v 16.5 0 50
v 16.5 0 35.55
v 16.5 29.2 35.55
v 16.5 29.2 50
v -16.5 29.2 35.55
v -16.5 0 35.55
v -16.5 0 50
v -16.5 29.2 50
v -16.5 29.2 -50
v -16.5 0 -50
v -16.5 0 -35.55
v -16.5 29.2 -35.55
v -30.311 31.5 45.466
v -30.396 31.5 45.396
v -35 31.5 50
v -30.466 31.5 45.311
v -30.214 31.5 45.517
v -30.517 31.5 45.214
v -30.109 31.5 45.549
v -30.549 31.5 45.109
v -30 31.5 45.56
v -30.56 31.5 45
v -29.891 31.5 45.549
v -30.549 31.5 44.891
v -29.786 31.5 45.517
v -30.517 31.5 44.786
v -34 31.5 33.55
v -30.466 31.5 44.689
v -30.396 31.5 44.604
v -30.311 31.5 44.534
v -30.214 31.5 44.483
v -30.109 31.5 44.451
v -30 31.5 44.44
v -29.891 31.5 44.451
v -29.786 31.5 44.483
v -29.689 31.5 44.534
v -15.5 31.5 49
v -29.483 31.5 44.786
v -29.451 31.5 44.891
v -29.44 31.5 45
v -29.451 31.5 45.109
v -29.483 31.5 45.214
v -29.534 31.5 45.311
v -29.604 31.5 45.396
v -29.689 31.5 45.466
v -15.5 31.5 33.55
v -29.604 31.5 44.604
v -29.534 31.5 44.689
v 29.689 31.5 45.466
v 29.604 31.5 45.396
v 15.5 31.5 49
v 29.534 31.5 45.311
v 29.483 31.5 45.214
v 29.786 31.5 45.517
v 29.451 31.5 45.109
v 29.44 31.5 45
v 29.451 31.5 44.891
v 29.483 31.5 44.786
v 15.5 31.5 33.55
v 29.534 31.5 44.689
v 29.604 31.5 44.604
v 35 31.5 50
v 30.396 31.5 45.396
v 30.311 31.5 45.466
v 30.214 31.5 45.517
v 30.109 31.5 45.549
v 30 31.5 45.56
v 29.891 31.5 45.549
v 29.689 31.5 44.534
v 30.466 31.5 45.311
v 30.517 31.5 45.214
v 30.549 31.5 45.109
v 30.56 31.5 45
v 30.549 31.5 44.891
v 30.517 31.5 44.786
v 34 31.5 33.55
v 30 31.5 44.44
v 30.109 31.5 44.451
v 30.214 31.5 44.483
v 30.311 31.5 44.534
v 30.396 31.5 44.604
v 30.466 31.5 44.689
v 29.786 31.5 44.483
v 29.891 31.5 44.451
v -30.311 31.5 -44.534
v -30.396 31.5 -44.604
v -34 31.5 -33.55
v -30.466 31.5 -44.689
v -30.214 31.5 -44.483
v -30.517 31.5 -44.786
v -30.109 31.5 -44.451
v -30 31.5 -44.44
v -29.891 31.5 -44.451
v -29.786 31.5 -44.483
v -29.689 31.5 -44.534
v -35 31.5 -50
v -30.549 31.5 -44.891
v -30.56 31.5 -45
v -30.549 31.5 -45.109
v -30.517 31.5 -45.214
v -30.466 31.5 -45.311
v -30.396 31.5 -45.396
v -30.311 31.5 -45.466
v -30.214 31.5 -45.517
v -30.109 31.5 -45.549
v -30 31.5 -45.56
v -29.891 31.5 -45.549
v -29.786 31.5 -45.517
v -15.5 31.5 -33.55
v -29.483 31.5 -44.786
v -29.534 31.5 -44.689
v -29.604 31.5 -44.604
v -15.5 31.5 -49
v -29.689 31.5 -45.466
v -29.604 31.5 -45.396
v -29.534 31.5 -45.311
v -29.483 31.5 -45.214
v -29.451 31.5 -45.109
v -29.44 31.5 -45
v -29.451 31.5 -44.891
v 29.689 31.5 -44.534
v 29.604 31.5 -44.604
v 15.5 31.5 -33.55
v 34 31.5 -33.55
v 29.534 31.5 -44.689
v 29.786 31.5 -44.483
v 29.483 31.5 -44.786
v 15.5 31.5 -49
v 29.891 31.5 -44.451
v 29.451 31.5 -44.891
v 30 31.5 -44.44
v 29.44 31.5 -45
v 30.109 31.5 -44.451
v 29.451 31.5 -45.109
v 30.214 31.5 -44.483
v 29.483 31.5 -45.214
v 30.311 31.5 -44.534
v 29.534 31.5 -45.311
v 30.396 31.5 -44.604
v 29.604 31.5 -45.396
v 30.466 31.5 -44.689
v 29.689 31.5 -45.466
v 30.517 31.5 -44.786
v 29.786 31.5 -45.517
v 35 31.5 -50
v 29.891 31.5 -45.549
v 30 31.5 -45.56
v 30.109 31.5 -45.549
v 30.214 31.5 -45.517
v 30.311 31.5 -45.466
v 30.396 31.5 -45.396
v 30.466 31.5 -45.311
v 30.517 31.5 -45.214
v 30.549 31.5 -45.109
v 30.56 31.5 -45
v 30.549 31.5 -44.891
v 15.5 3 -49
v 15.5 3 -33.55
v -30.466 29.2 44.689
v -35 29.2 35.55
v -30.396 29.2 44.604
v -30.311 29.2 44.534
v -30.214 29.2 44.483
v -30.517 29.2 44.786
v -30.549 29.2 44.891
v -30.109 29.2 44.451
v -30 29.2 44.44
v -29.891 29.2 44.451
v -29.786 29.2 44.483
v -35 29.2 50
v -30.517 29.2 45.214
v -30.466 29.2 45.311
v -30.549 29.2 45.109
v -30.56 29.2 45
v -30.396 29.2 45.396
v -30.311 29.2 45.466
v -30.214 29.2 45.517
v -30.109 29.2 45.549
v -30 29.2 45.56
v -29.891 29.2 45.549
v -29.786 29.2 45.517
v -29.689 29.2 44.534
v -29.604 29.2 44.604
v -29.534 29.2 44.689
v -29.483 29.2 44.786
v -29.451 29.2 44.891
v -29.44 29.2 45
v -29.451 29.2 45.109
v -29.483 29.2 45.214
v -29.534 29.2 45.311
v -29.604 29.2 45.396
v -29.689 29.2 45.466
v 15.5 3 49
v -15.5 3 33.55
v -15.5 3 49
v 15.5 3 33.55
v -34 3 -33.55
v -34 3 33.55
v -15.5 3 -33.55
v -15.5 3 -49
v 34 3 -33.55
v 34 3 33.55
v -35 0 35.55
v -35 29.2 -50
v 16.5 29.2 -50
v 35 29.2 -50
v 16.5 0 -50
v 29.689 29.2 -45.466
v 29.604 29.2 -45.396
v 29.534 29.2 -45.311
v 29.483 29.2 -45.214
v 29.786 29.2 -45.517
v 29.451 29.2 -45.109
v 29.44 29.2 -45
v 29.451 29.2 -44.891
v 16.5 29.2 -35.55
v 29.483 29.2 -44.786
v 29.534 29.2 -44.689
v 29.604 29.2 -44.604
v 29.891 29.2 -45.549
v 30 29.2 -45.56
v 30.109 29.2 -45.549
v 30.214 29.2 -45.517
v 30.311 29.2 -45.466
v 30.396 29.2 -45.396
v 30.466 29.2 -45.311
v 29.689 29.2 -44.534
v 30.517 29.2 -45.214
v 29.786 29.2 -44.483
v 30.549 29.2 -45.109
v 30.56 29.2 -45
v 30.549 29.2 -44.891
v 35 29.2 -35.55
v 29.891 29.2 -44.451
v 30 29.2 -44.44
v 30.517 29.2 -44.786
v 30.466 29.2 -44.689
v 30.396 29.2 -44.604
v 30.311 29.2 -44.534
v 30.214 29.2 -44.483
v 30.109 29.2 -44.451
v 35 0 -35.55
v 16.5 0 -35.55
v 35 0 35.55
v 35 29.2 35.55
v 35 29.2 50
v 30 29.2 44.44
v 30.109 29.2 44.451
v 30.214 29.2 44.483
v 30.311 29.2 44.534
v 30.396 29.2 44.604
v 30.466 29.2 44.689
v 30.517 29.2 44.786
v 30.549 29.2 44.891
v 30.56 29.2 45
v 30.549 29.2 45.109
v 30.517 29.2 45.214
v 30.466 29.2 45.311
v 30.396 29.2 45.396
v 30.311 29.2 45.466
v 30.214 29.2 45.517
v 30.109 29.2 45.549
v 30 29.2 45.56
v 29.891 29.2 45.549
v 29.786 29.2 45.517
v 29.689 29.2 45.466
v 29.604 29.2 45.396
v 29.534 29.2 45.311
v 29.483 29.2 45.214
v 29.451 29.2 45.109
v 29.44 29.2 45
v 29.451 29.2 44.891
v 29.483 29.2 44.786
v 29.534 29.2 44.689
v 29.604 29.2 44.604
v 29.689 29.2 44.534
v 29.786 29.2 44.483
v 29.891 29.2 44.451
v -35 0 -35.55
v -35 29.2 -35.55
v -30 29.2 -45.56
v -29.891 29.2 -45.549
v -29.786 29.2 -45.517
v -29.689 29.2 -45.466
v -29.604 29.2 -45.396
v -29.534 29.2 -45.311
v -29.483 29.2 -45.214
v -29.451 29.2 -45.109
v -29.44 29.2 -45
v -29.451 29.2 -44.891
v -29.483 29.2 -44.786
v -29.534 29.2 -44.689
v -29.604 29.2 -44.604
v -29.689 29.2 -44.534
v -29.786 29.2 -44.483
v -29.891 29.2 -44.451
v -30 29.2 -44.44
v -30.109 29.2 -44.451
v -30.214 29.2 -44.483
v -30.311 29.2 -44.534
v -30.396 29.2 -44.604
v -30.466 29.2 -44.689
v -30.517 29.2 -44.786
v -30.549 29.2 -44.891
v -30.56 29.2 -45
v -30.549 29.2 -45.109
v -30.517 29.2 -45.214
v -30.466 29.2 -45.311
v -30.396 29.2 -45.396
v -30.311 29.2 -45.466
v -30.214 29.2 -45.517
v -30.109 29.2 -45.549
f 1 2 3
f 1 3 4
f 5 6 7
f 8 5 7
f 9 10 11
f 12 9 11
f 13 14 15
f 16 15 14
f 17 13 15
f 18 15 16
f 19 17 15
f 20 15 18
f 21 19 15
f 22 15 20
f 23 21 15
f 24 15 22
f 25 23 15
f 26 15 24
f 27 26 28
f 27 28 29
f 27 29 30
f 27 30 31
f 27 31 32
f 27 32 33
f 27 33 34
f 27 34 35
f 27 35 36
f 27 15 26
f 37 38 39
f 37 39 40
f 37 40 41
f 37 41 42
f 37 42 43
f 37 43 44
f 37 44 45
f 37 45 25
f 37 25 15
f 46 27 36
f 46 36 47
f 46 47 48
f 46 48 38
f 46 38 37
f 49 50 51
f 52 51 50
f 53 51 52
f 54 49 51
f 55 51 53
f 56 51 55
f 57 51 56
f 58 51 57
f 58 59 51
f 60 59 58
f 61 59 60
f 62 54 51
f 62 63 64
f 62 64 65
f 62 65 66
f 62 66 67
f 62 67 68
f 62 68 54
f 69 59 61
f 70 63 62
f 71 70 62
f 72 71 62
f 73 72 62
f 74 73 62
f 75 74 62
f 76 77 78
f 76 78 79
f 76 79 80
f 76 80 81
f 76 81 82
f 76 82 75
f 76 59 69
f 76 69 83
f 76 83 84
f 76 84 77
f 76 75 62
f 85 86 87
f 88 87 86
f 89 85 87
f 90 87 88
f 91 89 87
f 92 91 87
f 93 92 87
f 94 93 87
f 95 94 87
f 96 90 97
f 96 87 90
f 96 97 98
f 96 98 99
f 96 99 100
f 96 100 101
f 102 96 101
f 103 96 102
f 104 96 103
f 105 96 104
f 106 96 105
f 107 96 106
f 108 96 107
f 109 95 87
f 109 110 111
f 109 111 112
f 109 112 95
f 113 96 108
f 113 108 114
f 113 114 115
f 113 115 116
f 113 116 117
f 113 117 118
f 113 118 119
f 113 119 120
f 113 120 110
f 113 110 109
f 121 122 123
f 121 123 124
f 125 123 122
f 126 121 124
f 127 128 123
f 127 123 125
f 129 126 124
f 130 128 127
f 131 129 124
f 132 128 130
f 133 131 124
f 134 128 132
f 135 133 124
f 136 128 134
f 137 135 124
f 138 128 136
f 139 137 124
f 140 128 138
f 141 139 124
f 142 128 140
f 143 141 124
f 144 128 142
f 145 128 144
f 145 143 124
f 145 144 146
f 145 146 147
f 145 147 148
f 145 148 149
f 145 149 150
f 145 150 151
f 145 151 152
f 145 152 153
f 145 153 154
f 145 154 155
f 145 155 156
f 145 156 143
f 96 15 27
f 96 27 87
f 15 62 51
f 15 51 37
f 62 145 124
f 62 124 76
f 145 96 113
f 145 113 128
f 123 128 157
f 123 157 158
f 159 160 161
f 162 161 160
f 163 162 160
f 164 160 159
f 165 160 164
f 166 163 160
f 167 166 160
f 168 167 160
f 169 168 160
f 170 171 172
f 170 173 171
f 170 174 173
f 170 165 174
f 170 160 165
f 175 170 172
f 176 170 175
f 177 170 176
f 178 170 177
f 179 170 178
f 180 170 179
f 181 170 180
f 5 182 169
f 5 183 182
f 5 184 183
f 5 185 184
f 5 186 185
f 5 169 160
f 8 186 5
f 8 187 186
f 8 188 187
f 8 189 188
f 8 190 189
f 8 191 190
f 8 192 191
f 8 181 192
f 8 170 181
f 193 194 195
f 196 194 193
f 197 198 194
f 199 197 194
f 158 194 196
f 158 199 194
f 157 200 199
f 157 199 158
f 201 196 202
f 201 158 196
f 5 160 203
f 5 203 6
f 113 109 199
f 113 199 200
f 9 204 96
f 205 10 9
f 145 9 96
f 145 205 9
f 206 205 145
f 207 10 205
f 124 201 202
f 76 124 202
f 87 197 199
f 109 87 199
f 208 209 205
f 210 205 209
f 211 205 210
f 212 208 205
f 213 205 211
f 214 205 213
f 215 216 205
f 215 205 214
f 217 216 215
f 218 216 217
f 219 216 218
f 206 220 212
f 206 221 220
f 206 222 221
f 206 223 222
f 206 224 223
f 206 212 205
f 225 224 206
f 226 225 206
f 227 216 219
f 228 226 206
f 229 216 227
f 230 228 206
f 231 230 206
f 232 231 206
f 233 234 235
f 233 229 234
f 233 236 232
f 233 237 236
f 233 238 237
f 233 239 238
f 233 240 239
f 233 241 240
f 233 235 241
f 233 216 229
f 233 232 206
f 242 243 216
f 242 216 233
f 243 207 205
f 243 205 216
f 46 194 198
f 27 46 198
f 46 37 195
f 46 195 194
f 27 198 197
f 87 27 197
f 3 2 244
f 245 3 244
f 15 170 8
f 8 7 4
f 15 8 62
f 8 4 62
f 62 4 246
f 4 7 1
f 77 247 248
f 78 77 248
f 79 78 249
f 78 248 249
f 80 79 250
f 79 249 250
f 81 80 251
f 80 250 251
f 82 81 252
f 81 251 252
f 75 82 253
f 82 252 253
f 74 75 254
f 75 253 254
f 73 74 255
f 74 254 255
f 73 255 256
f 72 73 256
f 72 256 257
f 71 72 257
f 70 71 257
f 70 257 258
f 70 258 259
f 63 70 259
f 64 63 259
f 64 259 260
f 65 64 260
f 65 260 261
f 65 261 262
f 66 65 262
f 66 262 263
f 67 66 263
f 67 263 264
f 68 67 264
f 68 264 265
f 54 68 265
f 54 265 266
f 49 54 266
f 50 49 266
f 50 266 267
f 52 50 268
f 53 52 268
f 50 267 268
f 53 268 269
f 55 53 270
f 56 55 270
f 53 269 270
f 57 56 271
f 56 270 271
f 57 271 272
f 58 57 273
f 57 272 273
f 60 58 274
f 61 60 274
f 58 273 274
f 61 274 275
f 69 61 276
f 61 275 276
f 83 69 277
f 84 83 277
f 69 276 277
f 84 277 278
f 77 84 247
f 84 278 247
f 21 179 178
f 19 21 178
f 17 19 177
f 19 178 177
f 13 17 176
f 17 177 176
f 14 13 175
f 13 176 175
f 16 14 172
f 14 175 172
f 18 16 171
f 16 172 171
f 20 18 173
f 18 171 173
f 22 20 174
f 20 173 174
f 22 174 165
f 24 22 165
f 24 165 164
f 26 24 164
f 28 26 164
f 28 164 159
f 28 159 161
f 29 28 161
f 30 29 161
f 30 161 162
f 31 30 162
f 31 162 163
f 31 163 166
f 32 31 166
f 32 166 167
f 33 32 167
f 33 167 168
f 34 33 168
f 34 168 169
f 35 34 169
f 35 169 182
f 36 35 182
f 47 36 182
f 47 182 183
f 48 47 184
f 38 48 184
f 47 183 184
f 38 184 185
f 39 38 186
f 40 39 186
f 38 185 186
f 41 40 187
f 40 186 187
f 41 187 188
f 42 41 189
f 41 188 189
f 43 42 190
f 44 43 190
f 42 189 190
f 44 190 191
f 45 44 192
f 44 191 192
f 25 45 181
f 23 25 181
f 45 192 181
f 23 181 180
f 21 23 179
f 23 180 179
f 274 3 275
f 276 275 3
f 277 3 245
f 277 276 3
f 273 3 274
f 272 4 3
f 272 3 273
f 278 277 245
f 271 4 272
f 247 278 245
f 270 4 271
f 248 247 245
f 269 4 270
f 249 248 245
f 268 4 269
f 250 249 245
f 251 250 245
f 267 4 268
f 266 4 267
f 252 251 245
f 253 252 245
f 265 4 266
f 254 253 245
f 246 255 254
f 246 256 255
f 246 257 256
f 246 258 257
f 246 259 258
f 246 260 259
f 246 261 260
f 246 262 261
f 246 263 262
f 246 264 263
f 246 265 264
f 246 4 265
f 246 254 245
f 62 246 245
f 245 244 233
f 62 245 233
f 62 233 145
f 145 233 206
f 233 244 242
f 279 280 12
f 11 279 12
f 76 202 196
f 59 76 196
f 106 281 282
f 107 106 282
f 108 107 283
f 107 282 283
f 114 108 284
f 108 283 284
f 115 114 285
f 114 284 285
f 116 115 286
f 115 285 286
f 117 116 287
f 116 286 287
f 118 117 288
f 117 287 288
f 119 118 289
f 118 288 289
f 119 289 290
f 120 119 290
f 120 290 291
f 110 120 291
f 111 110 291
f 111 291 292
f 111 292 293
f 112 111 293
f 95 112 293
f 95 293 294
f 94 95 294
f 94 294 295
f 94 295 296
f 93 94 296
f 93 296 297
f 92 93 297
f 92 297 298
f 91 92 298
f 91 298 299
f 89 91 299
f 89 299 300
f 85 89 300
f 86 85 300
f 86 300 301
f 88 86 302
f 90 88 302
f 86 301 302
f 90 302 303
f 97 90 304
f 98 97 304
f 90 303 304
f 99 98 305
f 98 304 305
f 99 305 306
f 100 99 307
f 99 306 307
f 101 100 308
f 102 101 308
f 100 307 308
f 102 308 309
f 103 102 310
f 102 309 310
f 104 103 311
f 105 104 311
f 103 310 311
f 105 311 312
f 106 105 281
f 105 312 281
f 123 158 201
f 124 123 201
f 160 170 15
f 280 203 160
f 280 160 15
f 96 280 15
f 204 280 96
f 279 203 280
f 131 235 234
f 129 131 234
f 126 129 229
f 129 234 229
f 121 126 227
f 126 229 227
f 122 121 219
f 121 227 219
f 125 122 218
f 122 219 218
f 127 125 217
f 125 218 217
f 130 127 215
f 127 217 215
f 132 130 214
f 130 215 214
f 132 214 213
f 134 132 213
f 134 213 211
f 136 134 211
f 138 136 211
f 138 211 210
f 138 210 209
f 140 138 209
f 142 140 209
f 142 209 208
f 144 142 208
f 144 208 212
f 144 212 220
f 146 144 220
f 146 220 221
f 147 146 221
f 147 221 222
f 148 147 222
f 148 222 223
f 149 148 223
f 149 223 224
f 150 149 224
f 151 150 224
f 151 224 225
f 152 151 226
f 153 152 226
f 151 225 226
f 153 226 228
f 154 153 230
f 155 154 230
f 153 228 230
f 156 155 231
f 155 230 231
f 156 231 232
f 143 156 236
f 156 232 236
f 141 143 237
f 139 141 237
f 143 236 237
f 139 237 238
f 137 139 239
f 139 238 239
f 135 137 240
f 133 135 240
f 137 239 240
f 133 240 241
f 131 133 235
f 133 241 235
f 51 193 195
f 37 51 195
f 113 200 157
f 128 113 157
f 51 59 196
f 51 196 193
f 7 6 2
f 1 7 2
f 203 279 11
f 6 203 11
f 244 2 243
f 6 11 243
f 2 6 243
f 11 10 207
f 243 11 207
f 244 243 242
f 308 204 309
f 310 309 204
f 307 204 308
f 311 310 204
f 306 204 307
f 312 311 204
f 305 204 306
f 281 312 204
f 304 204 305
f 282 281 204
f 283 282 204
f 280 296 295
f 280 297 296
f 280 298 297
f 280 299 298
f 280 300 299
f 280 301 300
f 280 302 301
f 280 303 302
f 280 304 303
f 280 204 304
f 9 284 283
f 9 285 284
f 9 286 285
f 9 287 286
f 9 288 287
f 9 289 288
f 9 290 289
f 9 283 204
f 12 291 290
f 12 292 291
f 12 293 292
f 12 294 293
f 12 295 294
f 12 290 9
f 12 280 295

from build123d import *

# Parameters (mm, degrees)
CROQUIS1_W              = 70
CROQUIS1_H              = 100
SALIENTE_EXTRUIR1_DEPTH = 3
CROQUIS2_W              = 70
CROQUIS2_H              = 100
SALIENTE_EXTRUIR2_DEPTH = 28.5
CROQUIS3_R              = 0.56
CORTAR_EXTRUIR1_DEPTH   = 69.682239334
CROQUIS4_W              = 18.5
CROQUIS4_H              = 14.45
CORTAR_EXTRUIR2_DEPTH   = 29.2


with BuildPart() as part:
    # Croquis1 → Saliente-Extruir1 (new body)
    with BuildSketch(Plane(origin=(0, 0, 0), x_dir=(1, 0, 0), z_dir=(0, 1, 0))):
        Rectangle(CROQUIS1_W, CROQUIS1_H)
    extrude(amount=SALIENTE_EXTRUIR1_DEPTH)

    # Croquis2 → Saliente-Extruir2 (add)
    with BuildSketch(Plane(origin=(0, 3, 0), x_dir=(1, 0, 0), z_dir=(0, 1, 0))):
        Rectangle(CROQUIS2_W, CROQUIS2_H)
        Polygon((-34, 33.55), (-15.5, 33.55), (-15.5, 49), (15.5, 49), (15.5, 33.55), (34, 33.55), (34, -33.55), (15.5, -33.55), (15.5, -49), (-15.5, -49), (-15.5, -33.55), (-34, -33.55), align=None, mode=Mode.SUBTRACT)
    extrude(amount=SALIENTE_EXTRUIR2_DEPTH)

    # Croquis3 → Cortar-Extruir1 (cut, through all)
    with BuildSketch(Plane.XZ):
        with Locations(Location((-30, -45, 0), (0, 0, 270))):
            Circle(CROQUIS3_R)
        with Locations(Location((-30, 45, 0), (0, 0, 90))):
            Circle(CROQUIS3_R)
        with Locations(Location((30, -45, 0), (0, 0, 90))):
            Circle(CROQUIS3_R)
        with Locations(Location((30, 45, 0), (0, 0, 270))):
            Circle(CROQUIS3_R)
    extrude(amount=-CORTAR_EXTRUIR1_DEPTH, mode=Mode.SUBTRACT)

    # Croquis4 → Cortar-Extruir2 (cut)
    with BuildSketch(Plane.XZ):
        with Locations((-25.75, 42.775)):
            Rectangle(CROQUIS4_W, CROQUIS4_H)
        with Locations((25.75, 42.775)):
            Rectangle(CROQUIS4_W, CROQUIS4_H)
        with Locations((25.75, -42.775)):
            Rectangle(CROQUIS4_W, CROQUIS4_H)
        with Locations((-25.75, -42.775)):
            Rectangle(CROQUIS4_W, CROQUIS4_H)
    extrude(amount=-CORTAR_EXTRUIR2_DEPTH, mode=Mode.SUBTRACT)


solid = part.part
